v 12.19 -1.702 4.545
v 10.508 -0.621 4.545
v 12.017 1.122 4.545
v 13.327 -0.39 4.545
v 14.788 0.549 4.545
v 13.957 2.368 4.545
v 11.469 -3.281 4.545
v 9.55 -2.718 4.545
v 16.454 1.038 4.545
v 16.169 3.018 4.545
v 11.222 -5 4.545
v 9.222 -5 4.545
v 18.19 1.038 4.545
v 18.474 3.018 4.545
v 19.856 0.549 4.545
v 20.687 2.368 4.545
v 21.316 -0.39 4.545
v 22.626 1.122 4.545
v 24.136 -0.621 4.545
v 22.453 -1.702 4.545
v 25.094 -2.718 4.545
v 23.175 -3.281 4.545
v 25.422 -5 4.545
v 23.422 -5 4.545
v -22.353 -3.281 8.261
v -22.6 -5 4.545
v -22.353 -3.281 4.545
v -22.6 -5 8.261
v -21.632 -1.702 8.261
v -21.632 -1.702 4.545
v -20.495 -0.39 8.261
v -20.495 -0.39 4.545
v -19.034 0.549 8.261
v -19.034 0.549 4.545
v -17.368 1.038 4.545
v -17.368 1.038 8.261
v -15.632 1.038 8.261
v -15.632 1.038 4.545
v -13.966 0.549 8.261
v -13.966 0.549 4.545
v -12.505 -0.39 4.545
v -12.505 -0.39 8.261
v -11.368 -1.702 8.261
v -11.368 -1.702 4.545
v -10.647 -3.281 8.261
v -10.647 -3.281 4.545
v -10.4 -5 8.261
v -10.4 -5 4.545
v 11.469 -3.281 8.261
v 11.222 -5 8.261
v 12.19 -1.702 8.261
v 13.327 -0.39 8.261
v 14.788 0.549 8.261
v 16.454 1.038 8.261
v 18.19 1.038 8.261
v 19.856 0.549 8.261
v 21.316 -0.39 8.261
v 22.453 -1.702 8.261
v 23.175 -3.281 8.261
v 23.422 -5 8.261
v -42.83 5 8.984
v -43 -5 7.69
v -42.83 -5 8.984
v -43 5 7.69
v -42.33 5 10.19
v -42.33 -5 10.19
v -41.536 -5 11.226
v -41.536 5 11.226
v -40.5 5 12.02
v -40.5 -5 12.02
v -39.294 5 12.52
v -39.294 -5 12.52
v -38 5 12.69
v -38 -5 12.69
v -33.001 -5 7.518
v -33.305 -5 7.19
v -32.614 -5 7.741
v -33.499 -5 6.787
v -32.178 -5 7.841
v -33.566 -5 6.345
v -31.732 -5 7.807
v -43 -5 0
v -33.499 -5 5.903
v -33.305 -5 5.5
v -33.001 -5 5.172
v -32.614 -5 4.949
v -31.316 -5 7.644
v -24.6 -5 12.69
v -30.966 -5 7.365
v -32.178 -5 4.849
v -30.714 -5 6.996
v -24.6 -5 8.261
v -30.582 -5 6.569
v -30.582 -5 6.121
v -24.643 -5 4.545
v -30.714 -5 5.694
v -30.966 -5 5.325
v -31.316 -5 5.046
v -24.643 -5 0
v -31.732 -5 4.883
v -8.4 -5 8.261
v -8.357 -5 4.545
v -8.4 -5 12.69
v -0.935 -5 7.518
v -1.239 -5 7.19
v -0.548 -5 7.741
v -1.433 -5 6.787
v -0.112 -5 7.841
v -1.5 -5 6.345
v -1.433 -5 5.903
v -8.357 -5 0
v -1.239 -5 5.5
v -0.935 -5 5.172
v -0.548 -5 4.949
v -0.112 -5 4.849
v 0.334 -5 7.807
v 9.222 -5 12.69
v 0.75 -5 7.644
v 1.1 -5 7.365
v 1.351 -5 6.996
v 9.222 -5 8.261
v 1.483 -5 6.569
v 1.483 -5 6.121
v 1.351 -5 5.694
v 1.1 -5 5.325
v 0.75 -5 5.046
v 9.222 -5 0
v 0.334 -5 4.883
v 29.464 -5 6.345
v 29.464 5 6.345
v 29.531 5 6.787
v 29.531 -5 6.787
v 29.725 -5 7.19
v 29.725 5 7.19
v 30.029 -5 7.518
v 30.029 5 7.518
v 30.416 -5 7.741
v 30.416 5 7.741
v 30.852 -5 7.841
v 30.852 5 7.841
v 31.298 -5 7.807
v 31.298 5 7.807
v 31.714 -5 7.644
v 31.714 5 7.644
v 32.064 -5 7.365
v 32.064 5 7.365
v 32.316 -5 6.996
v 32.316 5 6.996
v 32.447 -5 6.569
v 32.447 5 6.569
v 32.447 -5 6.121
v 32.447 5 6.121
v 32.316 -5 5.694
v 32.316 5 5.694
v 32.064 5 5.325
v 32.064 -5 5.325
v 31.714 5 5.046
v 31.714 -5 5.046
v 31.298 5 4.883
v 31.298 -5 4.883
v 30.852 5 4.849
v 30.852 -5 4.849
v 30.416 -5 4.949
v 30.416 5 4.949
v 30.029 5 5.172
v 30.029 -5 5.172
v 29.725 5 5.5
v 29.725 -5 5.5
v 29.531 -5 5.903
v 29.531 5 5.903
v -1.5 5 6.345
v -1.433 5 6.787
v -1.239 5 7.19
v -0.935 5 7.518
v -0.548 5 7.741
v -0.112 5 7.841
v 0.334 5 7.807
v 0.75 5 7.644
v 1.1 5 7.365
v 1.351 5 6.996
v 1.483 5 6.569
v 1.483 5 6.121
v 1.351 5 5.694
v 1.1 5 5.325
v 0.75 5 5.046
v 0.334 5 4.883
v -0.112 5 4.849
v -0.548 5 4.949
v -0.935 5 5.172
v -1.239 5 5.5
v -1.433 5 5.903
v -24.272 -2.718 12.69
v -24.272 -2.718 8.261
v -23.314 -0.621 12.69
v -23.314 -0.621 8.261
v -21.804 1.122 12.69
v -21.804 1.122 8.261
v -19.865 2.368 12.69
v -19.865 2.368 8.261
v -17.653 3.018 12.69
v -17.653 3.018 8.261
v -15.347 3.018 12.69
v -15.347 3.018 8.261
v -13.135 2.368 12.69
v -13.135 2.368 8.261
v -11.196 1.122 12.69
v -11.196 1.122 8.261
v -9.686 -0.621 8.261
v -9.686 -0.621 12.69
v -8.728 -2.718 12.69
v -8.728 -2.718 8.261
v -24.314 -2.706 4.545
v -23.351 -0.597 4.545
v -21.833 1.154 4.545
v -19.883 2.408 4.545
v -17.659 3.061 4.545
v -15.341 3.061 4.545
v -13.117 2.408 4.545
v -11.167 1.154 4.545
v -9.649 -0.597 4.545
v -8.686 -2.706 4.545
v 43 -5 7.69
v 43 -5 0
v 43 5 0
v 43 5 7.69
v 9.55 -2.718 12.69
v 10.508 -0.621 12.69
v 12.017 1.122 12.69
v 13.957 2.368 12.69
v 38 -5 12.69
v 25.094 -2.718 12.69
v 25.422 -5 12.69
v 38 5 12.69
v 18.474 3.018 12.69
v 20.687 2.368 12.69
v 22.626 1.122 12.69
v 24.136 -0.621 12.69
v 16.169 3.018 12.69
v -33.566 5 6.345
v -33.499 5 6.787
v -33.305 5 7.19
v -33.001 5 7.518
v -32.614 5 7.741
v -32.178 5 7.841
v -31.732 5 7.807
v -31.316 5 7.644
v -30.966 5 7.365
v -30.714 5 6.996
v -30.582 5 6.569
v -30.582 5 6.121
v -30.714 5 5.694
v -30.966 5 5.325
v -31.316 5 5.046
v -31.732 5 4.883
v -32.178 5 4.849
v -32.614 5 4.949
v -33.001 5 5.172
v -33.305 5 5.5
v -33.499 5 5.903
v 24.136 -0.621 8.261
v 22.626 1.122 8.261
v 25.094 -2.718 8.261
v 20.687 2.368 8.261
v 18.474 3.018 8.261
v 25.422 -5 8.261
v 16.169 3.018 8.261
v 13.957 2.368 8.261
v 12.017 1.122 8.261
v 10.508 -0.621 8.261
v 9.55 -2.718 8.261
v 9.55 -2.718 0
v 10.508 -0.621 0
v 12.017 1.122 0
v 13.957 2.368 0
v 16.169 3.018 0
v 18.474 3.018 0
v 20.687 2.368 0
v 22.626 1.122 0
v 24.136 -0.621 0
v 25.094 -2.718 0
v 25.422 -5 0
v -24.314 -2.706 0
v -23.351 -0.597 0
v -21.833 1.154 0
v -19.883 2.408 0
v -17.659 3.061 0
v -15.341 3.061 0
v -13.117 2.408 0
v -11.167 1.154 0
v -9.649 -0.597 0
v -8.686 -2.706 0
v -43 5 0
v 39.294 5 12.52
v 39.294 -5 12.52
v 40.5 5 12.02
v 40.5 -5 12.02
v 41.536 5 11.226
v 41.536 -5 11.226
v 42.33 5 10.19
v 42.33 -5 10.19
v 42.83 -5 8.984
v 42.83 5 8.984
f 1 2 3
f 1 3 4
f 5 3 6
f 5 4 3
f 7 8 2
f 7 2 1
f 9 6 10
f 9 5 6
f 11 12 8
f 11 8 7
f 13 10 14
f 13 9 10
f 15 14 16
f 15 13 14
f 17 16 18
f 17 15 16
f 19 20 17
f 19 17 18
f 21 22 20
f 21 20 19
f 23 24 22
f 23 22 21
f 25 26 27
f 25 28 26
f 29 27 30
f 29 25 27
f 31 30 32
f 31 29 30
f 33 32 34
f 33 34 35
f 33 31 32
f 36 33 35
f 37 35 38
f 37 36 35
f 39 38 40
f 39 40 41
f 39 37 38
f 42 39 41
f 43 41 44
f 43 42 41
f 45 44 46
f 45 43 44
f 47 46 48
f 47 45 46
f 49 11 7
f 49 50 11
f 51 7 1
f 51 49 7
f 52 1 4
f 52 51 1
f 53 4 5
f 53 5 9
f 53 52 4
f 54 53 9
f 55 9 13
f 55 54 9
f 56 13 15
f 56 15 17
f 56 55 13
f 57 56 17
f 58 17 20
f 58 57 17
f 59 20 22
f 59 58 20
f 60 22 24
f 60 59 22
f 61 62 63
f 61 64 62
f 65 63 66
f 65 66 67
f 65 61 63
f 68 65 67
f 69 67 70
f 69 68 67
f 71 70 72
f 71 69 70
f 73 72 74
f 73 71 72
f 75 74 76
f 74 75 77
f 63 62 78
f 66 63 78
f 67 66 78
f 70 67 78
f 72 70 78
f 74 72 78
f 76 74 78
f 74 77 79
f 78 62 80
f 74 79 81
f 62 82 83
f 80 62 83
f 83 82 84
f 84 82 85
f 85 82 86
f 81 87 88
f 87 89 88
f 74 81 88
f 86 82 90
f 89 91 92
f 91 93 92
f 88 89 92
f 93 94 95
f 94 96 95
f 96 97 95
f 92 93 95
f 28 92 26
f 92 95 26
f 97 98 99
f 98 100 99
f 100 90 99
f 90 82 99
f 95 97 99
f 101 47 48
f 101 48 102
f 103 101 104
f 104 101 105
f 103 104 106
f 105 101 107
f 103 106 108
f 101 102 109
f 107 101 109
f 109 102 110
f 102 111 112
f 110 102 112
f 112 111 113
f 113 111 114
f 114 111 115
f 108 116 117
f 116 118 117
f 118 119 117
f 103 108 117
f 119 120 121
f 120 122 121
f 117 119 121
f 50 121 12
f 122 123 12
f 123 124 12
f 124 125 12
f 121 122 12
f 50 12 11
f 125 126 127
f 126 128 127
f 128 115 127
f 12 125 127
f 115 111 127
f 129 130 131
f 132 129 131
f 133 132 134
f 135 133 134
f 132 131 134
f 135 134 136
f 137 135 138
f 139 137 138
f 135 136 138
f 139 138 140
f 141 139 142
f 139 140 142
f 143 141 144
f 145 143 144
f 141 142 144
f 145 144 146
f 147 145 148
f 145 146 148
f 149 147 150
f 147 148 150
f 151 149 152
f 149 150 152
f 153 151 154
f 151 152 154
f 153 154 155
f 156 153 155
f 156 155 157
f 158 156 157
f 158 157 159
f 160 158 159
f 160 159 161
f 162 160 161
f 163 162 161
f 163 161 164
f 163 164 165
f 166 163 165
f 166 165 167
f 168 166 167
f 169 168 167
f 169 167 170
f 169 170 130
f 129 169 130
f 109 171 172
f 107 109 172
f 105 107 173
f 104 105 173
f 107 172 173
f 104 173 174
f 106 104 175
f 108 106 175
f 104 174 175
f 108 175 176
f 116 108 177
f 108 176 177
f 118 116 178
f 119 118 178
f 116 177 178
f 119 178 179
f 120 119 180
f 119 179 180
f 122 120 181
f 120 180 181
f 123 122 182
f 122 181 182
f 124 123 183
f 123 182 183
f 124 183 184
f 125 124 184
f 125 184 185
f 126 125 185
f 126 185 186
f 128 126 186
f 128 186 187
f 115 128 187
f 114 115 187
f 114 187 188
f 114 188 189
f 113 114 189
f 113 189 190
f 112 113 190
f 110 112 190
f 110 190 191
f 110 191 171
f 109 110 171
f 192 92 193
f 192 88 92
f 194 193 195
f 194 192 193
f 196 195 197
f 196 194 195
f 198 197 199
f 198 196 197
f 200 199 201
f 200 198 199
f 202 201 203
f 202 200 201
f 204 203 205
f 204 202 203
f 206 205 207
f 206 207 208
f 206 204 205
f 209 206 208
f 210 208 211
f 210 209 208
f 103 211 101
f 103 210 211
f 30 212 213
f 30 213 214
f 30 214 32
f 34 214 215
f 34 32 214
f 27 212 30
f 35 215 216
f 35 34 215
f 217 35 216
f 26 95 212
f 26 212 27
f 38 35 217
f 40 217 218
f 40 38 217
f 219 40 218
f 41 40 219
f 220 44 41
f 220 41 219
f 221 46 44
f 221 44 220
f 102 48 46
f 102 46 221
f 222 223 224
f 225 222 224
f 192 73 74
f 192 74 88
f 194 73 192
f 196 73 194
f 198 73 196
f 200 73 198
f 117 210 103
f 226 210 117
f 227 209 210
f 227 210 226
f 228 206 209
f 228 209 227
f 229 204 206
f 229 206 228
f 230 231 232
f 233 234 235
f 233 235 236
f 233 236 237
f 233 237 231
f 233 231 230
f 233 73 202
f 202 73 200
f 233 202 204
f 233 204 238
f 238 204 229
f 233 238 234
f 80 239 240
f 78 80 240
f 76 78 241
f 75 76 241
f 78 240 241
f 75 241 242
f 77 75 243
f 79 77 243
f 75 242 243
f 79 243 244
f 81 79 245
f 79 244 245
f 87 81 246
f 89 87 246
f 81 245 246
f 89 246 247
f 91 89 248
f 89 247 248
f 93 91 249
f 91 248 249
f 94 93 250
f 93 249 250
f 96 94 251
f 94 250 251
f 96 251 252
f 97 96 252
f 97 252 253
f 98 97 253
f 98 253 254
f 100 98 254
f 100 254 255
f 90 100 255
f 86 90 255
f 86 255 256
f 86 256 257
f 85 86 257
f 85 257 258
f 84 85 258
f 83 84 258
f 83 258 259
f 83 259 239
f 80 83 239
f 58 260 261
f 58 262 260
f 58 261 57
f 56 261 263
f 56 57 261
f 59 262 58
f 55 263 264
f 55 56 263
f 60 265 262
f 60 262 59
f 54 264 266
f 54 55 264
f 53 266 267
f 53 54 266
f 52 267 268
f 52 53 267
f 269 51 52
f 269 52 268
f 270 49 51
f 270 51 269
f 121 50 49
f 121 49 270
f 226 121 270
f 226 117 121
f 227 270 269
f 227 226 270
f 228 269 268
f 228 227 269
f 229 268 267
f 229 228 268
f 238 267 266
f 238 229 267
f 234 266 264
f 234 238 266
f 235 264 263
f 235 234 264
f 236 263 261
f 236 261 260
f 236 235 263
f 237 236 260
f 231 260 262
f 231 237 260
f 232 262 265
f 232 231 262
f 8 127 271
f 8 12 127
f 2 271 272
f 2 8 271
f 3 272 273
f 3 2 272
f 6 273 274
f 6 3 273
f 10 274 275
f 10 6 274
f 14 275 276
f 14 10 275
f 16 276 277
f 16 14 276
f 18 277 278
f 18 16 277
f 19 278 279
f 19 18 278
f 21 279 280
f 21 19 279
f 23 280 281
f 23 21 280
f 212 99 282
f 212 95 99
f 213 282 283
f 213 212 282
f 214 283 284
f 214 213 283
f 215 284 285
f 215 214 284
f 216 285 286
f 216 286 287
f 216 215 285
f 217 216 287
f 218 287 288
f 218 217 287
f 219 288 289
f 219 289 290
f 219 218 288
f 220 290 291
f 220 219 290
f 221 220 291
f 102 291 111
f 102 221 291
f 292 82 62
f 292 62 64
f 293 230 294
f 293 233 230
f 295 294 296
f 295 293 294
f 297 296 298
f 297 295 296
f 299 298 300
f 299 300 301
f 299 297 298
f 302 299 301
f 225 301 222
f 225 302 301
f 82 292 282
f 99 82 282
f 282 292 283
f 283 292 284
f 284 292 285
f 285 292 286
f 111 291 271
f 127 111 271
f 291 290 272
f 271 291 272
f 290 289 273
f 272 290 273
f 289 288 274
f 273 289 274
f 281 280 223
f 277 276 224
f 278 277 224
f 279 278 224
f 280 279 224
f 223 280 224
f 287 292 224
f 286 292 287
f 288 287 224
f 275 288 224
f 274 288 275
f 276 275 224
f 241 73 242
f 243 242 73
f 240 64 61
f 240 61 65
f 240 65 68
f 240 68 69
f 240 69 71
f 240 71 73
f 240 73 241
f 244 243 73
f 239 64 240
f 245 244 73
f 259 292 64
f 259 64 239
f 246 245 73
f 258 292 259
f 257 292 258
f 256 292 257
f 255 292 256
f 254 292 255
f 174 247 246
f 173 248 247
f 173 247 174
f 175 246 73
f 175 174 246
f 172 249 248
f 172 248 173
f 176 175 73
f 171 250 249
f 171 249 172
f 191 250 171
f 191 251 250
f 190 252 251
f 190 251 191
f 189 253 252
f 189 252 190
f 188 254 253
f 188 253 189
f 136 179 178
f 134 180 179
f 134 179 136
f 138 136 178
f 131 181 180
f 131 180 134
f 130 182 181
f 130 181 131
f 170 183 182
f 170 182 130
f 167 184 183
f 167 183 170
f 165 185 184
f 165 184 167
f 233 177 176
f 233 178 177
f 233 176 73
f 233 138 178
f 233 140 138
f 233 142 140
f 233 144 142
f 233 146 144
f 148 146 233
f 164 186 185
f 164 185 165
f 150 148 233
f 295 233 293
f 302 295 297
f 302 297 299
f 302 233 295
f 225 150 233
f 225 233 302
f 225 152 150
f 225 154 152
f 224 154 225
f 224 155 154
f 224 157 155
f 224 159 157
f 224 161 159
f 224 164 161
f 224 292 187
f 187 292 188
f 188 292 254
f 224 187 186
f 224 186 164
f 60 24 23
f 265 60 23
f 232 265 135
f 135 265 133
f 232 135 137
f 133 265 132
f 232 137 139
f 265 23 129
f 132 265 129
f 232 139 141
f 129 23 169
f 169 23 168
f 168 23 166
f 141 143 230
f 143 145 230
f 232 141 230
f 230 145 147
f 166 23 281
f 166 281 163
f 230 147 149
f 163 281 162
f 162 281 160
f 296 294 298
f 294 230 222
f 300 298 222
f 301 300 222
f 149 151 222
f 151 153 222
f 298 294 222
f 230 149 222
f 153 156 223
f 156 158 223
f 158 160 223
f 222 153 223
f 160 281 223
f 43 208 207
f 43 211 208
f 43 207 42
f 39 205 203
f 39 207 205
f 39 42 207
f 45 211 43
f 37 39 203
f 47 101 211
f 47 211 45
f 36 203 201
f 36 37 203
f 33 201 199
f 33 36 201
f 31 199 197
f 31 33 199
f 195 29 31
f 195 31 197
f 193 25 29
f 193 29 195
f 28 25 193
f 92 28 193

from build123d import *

# Parameters (mm, degrees)
F0_W     = 86
F0_H     = 10
F1_DEPTH = 12.69
F2_W     = 6.1
F2_H     = 3.7164622918
F4_W     = 6.1
F4_H     = 3.7164622918
F6_R     = 5
F7_R     = 1.5
F8_DEPTH = 10.001


# Not quite as in the source:
# - a feature names something its author has since deleted; it is built from what else it names


with BuildPart() as f1:
    # F0 (on Top) → F1 (new body)
    with BuildSketch(Plane.XY):
        Rectangle(F0_W, F0_H)
    extrude(amount=F1_DEPTH)

    # F2 (on face) → F3 (revolve, cut)
    with BuildSketch(Plane.XZ.offset(5)):
        Polygon((-8.4, 12.69), (-16.5, 12.69), (-16.5, 8.2610268146), (-10.4, 8.2610268146), (-8.4, 8.2610268146), align=None)
        with Locations((-13.45, 6.4027956687)):
            Rectangle(F2_W, F2_H)
        Polygon((-10.4, 4.5445645228), (-16.5, 4.5445645228), (-16.5, 0), (-8.3565199748, 0), (-8.3565199748, 4.5445645228), align=None)
    revolve(axis=Axis((-16.5, -5, 6.345), (0, 0, -1)), mode=Mode.SUBTRACT)

    # F4 (on face) → F5 (revolve, cut)
    with BuildSketch(Plane.XZ.offset(5)):
        Polygon((25.4217400126, 12.69), (17.3217400126, 12.69), (17.3217400126, 8.2610268146), (23.4217400126, 8.2610268146), (25.4217400126, 8.2610268146), align=None)
        with Locations((20.3717400126, 6.4027956687)):
            Rectangle(F4_W, F4_H)
        Polygon((23.4217400126, 4.5445645228), (17.3217400126, 4.5445645228), (17.3217400126, 0), (25.4217400126, 0), (25.4217400126, 4.5445645228), align=None)
    revolve(axis=Axis((17.3217400126, -5, 6.345), (0, 0, -1)), mode=Mode.SUBTRACT)

    # F6
    f6_edges = [f1.edges().sort_by_distance(p)[0] for p in [
        (-43, 0, 12.69),
        (43, 0, 12.69),
    ]]
    fillet(f6_edges, radius=F6_R)

    # F7 (on face) → F8 (cut, through all)
    with BuildSketch(Plane(origin=(0, 5, 0), x_dir=(-1, 0, 0), z_dir=(0, 1, 0))):
        with Locations((-30.9640802443, 6.345)):
            Circle(F7_R)
        with Locations((0, 6.345)):
            Circle(F7_R)
        with Locations((32.0656448603, 6.345)):
            Circle(F7_R)
    extrude(amount=-F8_DEPTH, mode=Mode.SUBTRACT)


solid = f1.part
